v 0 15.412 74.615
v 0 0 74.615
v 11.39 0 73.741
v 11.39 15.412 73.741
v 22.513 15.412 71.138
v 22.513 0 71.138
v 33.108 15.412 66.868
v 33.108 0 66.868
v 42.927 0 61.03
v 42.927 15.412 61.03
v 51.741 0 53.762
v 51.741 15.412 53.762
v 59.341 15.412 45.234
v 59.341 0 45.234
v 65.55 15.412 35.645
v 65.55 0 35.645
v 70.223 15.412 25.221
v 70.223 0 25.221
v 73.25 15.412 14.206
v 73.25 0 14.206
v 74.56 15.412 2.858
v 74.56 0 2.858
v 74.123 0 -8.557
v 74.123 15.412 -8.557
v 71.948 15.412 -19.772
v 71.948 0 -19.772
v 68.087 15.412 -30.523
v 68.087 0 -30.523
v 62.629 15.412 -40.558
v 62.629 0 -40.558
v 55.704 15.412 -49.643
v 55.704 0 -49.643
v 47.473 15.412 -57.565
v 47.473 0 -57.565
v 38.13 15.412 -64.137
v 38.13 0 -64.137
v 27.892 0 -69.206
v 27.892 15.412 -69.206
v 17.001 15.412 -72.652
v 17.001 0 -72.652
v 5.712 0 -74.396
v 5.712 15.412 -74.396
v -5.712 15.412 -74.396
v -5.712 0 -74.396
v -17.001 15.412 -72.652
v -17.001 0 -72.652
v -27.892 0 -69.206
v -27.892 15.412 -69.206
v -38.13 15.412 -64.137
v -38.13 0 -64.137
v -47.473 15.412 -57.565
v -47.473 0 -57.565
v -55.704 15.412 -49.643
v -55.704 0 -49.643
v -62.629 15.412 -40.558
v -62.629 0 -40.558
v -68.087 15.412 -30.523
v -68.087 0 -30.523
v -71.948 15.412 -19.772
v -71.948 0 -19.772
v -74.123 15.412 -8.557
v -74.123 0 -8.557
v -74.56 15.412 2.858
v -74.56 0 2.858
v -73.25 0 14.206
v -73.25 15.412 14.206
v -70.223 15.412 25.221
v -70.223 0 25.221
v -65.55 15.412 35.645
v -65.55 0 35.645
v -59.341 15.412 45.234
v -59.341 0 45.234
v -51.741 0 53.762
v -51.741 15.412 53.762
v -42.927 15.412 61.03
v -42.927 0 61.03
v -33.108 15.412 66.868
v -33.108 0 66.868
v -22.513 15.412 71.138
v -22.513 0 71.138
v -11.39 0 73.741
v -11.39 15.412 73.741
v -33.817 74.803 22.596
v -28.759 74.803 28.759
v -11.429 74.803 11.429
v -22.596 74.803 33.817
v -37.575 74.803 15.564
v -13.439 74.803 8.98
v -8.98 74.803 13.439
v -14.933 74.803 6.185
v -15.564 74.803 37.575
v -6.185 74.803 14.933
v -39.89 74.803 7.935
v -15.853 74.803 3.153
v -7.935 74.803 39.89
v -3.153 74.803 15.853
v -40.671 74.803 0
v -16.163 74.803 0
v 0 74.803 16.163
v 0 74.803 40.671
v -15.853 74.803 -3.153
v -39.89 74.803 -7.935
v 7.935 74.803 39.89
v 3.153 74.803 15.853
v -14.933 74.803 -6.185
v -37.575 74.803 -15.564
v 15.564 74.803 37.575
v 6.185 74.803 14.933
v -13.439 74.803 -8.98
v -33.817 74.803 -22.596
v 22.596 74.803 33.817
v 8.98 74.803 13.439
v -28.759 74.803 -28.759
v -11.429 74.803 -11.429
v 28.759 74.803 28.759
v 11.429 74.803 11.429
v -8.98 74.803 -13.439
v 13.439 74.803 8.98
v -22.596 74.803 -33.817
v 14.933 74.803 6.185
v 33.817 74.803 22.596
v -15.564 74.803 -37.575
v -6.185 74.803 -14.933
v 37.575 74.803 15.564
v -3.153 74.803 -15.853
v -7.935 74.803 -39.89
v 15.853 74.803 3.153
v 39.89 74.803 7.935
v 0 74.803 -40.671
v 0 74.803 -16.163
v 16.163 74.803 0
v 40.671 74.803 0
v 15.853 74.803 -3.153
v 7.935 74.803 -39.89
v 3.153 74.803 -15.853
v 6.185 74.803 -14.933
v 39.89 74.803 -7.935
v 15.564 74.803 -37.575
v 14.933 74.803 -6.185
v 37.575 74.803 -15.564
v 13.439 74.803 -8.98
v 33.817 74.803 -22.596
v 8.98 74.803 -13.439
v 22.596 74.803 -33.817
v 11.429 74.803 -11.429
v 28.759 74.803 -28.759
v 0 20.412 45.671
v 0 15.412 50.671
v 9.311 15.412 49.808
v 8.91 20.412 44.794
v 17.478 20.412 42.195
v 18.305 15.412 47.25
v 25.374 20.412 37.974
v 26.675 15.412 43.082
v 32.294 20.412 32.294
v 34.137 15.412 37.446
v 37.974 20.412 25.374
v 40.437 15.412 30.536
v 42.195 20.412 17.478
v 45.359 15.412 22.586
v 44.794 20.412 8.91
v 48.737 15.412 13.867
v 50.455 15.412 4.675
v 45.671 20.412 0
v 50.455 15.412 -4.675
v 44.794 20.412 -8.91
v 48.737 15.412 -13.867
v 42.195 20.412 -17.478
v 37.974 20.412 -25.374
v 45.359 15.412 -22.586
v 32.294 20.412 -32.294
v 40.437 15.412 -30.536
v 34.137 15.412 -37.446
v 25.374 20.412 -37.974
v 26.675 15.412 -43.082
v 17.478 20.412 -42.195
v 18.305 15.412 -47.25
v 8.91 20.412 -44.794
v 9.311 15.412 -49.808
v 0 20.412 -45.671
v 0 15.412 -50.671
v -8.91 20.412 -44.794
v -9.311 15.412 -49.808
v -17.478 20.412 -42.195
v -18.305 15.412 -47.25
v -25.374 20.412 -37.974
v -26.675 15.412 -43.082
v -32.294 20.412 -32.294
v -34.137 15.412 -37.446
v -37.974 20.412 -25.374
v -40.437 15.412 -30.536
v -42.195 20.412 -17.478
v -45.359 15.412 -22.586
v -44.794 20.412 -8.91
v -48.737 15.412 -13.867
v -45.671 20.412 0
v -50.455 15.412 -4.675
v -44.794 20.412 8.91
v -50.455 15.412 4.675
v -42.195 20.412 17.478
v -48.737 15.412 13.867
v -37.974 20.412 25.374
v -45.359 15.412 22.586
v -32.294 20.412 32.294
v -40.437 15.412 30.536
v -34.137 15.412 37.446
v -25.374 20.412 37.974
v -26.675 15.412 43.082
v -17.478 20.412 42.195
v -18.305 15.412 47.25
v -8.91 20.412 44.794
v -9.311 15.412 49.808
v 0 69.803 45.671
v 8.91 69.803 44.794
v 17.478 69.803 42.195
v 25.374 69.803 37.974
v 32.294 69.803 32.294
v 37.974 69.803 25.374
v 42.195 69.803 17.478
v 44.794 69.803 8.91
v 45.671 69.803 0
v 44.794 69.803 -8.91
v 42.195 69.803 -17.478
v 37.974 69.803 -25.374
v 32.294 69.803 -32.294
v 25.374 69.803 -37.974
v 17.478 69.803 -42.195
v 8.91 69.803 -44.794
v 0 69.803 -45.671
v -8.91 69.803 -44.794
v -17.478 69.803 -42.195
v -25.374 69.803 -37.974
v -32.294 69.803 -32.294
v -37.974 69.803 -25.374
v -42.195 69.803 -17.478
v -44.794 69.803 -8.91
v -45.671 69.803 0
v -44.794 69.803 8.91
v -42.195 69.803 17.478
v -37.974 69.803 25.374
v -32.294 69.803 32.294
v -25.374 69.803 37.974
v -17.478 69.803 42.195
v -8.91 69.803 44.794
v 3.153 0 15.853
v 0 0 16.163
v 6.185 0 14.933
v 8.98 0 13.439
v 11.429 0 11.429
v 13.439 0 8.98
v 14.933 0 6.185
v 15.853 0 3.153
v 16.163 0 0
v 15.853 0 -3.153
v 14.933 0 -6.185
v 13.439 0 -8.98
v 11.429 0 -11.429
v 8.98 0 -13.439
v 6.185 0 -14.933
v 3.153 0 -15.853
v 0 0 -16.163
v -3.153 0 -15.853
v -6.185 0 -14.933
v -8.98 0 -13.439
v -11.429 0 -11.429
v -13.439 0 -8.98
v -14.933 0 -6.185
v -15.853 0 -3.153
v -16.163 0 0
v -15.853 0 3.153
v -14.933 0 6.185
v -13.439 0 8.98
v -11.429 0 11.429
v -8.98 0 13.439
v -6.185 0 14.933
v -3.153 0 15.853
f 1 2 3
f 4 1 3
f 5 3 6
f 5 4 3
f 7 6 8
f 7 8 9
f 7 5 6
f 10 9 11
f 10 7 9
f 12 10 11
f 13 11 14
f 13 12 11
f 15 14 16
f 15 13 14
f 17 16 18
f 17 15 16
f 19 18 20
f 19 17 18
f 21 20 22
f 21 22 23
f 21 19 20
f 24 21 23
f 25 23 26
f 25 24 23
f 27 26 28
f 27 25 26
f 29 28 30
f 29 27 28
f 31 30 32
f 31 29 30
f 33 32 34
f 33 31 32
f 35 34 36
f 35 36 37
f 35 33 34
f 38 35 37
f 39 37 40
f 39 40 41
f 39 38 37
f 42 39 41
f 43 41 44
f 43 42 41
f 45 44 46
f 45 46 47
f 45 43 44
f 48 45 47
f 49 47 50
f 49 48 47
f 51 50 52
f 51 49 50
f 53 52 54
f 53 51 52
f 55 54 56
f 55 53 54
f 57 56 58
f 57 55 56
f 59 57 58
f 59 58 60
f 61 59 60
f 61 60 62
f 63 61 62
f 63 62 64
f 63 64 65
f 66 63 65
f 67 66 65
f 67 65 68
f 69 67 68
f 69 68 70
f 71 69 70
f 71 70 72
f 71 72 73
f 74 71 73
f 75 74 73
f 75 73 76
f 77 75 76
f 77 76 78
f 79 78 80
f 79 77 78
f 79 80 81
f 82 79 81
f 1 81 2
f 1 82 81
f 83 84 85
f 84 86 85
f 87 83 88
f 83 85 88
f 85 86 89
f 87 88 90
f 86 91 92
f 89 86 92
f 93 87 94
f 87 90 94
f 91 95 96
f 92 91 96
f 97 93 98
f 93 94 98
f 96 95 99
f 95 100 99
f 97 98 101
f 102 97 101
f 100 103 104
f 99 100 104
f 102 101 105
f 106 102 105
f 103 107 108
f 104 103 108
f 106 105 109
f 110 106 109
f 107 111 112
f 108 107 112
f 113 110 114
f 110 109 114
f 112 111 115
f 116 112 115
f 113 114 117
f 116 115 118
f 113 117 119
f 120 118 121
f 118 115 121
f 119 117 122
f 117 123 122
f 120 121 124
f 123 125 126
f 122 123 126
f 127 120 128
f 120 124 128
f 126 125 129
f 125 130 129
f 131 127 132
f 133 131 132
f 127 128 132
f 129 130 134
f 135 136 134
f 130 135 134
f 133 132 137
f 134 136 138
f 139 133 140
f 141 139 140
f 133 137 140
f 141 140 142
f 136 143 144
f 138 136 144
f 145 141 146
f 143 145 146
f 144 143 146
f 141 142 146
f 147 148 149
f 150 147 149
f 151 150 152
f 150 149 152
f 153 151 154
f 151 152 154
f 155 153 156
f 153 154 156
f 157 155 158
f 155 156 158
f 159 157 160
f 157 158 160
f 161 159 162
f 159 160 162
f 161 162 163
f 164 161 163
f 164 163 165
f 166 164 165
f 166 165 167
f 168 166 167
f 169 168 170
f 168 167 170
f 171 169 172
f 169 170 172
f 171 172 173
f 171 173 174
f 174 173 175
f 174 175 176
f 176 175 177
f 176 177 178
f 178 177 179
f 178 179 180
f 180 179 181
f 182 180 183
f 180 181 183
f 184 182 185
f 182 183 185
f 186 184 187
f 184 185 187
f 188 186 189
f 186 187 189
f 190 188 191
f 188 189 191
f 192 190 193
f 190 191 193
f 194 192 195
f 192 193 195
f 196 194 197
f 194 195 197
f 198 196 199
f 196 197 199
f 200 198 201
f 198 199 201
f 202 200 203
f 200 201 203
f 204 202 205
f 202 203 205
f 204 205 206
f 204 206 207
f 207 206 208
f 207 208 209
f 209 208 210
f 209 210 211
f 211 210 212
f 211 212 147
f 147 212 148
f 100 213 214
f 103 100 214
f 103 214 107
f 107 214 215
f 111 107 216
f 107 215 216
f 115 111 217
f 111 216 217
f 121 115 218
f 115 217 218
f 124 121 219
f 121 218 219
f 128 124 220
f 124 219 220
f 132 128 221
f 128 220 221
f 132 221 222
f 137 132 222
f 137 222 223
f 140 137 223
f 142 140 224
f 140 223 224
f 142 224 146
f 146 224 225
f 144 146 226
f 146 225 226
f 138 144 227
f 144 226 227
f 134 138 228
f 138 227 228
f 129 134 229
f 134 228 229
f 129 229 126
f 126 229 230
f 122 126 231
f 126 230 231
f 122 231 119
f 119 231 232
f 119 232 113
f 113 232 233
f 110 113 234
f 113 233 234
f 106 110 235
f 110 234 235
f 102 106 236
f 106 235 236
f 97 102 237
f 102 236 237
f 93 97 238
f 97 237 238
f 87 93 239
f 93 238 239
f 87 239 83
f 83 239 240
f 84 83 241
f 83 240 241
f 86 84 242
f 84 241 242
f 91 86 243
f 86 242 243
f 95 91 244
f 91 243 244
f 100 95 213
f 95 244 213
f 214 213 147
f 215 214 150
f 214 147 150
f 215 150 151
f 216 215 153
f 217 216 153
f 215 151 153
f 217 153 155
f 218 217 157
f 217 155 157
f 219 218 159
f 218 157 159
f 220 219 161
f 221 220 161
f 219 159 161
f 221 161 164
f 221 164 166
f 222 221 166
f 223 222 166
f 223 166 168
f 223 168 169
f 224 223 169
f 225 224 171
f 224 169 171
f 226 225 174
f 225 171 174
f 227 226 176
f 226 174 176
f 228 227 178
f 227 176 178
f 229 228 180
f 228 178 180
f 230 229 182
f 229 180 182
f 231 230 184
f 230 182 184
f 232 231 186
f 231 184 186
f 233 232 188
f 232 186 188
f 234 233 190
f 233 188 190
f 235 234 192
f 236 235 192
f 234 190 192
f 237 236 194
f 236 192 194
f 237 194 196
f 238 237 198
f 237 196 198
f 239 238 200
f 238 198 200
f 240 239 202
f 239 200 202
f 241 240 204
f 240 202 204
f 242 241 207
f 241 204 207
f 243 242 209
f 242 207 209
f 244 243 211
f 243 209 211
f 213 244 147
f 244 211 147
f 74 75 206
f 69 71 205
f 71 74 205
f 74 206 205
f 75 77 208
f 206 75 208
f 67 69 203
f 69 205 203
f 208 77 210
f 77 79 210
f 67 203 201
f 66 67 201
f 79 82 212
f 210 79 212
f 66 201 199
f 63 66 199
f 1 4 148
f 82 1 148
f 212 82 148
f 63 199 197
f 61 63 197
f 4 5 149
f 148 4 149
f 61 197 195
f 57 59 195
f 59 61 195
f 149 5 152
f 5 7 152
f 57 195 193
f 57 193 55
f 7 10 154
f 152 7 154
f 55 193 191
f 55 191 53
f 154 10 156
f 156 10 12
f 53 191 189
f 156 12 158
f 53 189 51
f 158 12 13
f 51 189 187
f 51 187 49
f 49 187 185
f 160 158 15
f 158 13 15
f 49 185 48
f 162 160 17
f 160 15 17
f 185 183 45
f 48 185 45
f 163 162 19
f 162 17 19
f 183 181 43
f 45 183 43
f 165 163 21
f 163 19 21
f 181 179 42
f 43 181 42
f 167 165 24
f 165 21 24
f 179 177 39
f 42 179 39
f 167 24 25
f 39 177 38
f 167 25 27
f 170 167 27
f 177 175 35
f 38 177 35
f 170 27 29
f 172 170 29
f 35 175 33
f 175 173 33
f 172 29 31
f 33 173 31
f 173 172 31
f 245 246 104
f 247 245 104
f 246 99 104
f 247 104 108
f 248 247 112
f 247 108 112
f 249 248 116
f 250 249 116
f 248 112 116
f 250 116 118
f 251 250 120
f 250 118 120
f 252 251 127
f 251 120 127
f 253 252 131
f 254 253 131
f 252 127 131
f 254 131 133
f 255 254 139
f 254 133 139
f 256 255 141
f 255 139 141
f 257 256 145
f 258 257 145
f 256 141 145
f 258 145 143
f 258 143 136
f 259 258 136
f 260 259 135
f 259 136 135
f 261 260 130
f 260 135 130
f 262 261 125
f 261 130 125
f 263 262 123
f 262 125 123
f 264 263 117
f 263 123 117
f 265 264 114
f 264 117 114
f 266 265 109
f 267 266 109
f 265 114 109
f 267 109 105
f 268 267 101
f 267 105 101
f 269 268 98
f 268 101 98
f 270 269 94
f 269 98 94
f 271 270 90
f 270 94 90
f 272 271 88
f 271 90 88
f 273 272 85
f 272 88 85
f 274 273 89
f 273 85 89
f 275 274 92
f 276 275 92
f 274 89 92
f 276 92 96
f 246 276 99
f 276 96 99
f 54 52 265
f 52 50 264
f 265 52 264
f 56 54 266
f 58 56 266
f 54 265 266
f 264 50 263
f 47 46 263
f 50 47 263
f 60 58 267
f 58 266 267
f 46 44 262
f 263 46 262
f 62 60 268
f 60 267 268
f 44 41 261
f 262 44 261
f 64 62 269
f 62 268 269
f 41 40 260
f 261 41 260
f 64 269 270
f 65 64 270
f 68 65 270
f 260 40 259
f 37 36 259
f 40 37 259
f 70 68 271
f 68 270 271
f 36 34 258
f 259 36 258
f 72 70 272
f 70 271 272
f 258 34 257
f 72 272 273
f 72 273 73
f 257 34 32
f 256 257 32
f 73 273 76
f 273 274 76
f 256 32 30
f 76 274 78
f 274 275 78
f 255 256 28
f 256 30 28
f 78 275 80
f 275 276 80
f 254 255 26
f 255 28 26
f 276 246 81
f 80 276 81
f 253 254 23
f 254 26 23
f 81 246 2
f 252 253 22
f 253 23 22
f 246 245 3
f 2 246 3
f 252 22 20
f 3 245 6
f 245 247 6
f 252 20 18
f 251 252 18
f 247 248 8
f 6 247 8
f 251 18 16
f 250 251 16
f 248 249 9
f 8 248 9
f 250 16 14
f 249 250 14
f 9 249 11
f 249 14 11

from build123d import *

# Parameters (mm, degrees)
F0_W    = 15.4116954654
F0_H    = 29.5077543706
F0_W_2  = 59.3914035708
F0_H_2  = 28.9439186454
F2_SIZE = 5


with BuildPart() as f1:
    # F0 (on Right) → F1 (revolve)
    with BuildSketch(Plane.YZ):
        with Locations((7.7058477327, 30.91736231)):
            Rectangle(F0_W, F0_H)
        with Locations((45.1073972508, 30.91736231)):
            Rectangle(F0_W_2, F0_H)
        with Locations((7.7058477327, 60.143198818)):
            Rectangle(F0_W, F0_H_2)
    revolve(axis=Axis((0, 37.4015495181, 0), (0, 1, 0)))

    # F2
    f2_edges = [f1.edges().sort_by_distance(p)[0] for p in [
        (0, 15.411695, -45.671239),
        (0, 74.803099, -45.671239),
    ]]
    chamfer(f2_edges, length=F2_SIZE)


solid = f1.part
